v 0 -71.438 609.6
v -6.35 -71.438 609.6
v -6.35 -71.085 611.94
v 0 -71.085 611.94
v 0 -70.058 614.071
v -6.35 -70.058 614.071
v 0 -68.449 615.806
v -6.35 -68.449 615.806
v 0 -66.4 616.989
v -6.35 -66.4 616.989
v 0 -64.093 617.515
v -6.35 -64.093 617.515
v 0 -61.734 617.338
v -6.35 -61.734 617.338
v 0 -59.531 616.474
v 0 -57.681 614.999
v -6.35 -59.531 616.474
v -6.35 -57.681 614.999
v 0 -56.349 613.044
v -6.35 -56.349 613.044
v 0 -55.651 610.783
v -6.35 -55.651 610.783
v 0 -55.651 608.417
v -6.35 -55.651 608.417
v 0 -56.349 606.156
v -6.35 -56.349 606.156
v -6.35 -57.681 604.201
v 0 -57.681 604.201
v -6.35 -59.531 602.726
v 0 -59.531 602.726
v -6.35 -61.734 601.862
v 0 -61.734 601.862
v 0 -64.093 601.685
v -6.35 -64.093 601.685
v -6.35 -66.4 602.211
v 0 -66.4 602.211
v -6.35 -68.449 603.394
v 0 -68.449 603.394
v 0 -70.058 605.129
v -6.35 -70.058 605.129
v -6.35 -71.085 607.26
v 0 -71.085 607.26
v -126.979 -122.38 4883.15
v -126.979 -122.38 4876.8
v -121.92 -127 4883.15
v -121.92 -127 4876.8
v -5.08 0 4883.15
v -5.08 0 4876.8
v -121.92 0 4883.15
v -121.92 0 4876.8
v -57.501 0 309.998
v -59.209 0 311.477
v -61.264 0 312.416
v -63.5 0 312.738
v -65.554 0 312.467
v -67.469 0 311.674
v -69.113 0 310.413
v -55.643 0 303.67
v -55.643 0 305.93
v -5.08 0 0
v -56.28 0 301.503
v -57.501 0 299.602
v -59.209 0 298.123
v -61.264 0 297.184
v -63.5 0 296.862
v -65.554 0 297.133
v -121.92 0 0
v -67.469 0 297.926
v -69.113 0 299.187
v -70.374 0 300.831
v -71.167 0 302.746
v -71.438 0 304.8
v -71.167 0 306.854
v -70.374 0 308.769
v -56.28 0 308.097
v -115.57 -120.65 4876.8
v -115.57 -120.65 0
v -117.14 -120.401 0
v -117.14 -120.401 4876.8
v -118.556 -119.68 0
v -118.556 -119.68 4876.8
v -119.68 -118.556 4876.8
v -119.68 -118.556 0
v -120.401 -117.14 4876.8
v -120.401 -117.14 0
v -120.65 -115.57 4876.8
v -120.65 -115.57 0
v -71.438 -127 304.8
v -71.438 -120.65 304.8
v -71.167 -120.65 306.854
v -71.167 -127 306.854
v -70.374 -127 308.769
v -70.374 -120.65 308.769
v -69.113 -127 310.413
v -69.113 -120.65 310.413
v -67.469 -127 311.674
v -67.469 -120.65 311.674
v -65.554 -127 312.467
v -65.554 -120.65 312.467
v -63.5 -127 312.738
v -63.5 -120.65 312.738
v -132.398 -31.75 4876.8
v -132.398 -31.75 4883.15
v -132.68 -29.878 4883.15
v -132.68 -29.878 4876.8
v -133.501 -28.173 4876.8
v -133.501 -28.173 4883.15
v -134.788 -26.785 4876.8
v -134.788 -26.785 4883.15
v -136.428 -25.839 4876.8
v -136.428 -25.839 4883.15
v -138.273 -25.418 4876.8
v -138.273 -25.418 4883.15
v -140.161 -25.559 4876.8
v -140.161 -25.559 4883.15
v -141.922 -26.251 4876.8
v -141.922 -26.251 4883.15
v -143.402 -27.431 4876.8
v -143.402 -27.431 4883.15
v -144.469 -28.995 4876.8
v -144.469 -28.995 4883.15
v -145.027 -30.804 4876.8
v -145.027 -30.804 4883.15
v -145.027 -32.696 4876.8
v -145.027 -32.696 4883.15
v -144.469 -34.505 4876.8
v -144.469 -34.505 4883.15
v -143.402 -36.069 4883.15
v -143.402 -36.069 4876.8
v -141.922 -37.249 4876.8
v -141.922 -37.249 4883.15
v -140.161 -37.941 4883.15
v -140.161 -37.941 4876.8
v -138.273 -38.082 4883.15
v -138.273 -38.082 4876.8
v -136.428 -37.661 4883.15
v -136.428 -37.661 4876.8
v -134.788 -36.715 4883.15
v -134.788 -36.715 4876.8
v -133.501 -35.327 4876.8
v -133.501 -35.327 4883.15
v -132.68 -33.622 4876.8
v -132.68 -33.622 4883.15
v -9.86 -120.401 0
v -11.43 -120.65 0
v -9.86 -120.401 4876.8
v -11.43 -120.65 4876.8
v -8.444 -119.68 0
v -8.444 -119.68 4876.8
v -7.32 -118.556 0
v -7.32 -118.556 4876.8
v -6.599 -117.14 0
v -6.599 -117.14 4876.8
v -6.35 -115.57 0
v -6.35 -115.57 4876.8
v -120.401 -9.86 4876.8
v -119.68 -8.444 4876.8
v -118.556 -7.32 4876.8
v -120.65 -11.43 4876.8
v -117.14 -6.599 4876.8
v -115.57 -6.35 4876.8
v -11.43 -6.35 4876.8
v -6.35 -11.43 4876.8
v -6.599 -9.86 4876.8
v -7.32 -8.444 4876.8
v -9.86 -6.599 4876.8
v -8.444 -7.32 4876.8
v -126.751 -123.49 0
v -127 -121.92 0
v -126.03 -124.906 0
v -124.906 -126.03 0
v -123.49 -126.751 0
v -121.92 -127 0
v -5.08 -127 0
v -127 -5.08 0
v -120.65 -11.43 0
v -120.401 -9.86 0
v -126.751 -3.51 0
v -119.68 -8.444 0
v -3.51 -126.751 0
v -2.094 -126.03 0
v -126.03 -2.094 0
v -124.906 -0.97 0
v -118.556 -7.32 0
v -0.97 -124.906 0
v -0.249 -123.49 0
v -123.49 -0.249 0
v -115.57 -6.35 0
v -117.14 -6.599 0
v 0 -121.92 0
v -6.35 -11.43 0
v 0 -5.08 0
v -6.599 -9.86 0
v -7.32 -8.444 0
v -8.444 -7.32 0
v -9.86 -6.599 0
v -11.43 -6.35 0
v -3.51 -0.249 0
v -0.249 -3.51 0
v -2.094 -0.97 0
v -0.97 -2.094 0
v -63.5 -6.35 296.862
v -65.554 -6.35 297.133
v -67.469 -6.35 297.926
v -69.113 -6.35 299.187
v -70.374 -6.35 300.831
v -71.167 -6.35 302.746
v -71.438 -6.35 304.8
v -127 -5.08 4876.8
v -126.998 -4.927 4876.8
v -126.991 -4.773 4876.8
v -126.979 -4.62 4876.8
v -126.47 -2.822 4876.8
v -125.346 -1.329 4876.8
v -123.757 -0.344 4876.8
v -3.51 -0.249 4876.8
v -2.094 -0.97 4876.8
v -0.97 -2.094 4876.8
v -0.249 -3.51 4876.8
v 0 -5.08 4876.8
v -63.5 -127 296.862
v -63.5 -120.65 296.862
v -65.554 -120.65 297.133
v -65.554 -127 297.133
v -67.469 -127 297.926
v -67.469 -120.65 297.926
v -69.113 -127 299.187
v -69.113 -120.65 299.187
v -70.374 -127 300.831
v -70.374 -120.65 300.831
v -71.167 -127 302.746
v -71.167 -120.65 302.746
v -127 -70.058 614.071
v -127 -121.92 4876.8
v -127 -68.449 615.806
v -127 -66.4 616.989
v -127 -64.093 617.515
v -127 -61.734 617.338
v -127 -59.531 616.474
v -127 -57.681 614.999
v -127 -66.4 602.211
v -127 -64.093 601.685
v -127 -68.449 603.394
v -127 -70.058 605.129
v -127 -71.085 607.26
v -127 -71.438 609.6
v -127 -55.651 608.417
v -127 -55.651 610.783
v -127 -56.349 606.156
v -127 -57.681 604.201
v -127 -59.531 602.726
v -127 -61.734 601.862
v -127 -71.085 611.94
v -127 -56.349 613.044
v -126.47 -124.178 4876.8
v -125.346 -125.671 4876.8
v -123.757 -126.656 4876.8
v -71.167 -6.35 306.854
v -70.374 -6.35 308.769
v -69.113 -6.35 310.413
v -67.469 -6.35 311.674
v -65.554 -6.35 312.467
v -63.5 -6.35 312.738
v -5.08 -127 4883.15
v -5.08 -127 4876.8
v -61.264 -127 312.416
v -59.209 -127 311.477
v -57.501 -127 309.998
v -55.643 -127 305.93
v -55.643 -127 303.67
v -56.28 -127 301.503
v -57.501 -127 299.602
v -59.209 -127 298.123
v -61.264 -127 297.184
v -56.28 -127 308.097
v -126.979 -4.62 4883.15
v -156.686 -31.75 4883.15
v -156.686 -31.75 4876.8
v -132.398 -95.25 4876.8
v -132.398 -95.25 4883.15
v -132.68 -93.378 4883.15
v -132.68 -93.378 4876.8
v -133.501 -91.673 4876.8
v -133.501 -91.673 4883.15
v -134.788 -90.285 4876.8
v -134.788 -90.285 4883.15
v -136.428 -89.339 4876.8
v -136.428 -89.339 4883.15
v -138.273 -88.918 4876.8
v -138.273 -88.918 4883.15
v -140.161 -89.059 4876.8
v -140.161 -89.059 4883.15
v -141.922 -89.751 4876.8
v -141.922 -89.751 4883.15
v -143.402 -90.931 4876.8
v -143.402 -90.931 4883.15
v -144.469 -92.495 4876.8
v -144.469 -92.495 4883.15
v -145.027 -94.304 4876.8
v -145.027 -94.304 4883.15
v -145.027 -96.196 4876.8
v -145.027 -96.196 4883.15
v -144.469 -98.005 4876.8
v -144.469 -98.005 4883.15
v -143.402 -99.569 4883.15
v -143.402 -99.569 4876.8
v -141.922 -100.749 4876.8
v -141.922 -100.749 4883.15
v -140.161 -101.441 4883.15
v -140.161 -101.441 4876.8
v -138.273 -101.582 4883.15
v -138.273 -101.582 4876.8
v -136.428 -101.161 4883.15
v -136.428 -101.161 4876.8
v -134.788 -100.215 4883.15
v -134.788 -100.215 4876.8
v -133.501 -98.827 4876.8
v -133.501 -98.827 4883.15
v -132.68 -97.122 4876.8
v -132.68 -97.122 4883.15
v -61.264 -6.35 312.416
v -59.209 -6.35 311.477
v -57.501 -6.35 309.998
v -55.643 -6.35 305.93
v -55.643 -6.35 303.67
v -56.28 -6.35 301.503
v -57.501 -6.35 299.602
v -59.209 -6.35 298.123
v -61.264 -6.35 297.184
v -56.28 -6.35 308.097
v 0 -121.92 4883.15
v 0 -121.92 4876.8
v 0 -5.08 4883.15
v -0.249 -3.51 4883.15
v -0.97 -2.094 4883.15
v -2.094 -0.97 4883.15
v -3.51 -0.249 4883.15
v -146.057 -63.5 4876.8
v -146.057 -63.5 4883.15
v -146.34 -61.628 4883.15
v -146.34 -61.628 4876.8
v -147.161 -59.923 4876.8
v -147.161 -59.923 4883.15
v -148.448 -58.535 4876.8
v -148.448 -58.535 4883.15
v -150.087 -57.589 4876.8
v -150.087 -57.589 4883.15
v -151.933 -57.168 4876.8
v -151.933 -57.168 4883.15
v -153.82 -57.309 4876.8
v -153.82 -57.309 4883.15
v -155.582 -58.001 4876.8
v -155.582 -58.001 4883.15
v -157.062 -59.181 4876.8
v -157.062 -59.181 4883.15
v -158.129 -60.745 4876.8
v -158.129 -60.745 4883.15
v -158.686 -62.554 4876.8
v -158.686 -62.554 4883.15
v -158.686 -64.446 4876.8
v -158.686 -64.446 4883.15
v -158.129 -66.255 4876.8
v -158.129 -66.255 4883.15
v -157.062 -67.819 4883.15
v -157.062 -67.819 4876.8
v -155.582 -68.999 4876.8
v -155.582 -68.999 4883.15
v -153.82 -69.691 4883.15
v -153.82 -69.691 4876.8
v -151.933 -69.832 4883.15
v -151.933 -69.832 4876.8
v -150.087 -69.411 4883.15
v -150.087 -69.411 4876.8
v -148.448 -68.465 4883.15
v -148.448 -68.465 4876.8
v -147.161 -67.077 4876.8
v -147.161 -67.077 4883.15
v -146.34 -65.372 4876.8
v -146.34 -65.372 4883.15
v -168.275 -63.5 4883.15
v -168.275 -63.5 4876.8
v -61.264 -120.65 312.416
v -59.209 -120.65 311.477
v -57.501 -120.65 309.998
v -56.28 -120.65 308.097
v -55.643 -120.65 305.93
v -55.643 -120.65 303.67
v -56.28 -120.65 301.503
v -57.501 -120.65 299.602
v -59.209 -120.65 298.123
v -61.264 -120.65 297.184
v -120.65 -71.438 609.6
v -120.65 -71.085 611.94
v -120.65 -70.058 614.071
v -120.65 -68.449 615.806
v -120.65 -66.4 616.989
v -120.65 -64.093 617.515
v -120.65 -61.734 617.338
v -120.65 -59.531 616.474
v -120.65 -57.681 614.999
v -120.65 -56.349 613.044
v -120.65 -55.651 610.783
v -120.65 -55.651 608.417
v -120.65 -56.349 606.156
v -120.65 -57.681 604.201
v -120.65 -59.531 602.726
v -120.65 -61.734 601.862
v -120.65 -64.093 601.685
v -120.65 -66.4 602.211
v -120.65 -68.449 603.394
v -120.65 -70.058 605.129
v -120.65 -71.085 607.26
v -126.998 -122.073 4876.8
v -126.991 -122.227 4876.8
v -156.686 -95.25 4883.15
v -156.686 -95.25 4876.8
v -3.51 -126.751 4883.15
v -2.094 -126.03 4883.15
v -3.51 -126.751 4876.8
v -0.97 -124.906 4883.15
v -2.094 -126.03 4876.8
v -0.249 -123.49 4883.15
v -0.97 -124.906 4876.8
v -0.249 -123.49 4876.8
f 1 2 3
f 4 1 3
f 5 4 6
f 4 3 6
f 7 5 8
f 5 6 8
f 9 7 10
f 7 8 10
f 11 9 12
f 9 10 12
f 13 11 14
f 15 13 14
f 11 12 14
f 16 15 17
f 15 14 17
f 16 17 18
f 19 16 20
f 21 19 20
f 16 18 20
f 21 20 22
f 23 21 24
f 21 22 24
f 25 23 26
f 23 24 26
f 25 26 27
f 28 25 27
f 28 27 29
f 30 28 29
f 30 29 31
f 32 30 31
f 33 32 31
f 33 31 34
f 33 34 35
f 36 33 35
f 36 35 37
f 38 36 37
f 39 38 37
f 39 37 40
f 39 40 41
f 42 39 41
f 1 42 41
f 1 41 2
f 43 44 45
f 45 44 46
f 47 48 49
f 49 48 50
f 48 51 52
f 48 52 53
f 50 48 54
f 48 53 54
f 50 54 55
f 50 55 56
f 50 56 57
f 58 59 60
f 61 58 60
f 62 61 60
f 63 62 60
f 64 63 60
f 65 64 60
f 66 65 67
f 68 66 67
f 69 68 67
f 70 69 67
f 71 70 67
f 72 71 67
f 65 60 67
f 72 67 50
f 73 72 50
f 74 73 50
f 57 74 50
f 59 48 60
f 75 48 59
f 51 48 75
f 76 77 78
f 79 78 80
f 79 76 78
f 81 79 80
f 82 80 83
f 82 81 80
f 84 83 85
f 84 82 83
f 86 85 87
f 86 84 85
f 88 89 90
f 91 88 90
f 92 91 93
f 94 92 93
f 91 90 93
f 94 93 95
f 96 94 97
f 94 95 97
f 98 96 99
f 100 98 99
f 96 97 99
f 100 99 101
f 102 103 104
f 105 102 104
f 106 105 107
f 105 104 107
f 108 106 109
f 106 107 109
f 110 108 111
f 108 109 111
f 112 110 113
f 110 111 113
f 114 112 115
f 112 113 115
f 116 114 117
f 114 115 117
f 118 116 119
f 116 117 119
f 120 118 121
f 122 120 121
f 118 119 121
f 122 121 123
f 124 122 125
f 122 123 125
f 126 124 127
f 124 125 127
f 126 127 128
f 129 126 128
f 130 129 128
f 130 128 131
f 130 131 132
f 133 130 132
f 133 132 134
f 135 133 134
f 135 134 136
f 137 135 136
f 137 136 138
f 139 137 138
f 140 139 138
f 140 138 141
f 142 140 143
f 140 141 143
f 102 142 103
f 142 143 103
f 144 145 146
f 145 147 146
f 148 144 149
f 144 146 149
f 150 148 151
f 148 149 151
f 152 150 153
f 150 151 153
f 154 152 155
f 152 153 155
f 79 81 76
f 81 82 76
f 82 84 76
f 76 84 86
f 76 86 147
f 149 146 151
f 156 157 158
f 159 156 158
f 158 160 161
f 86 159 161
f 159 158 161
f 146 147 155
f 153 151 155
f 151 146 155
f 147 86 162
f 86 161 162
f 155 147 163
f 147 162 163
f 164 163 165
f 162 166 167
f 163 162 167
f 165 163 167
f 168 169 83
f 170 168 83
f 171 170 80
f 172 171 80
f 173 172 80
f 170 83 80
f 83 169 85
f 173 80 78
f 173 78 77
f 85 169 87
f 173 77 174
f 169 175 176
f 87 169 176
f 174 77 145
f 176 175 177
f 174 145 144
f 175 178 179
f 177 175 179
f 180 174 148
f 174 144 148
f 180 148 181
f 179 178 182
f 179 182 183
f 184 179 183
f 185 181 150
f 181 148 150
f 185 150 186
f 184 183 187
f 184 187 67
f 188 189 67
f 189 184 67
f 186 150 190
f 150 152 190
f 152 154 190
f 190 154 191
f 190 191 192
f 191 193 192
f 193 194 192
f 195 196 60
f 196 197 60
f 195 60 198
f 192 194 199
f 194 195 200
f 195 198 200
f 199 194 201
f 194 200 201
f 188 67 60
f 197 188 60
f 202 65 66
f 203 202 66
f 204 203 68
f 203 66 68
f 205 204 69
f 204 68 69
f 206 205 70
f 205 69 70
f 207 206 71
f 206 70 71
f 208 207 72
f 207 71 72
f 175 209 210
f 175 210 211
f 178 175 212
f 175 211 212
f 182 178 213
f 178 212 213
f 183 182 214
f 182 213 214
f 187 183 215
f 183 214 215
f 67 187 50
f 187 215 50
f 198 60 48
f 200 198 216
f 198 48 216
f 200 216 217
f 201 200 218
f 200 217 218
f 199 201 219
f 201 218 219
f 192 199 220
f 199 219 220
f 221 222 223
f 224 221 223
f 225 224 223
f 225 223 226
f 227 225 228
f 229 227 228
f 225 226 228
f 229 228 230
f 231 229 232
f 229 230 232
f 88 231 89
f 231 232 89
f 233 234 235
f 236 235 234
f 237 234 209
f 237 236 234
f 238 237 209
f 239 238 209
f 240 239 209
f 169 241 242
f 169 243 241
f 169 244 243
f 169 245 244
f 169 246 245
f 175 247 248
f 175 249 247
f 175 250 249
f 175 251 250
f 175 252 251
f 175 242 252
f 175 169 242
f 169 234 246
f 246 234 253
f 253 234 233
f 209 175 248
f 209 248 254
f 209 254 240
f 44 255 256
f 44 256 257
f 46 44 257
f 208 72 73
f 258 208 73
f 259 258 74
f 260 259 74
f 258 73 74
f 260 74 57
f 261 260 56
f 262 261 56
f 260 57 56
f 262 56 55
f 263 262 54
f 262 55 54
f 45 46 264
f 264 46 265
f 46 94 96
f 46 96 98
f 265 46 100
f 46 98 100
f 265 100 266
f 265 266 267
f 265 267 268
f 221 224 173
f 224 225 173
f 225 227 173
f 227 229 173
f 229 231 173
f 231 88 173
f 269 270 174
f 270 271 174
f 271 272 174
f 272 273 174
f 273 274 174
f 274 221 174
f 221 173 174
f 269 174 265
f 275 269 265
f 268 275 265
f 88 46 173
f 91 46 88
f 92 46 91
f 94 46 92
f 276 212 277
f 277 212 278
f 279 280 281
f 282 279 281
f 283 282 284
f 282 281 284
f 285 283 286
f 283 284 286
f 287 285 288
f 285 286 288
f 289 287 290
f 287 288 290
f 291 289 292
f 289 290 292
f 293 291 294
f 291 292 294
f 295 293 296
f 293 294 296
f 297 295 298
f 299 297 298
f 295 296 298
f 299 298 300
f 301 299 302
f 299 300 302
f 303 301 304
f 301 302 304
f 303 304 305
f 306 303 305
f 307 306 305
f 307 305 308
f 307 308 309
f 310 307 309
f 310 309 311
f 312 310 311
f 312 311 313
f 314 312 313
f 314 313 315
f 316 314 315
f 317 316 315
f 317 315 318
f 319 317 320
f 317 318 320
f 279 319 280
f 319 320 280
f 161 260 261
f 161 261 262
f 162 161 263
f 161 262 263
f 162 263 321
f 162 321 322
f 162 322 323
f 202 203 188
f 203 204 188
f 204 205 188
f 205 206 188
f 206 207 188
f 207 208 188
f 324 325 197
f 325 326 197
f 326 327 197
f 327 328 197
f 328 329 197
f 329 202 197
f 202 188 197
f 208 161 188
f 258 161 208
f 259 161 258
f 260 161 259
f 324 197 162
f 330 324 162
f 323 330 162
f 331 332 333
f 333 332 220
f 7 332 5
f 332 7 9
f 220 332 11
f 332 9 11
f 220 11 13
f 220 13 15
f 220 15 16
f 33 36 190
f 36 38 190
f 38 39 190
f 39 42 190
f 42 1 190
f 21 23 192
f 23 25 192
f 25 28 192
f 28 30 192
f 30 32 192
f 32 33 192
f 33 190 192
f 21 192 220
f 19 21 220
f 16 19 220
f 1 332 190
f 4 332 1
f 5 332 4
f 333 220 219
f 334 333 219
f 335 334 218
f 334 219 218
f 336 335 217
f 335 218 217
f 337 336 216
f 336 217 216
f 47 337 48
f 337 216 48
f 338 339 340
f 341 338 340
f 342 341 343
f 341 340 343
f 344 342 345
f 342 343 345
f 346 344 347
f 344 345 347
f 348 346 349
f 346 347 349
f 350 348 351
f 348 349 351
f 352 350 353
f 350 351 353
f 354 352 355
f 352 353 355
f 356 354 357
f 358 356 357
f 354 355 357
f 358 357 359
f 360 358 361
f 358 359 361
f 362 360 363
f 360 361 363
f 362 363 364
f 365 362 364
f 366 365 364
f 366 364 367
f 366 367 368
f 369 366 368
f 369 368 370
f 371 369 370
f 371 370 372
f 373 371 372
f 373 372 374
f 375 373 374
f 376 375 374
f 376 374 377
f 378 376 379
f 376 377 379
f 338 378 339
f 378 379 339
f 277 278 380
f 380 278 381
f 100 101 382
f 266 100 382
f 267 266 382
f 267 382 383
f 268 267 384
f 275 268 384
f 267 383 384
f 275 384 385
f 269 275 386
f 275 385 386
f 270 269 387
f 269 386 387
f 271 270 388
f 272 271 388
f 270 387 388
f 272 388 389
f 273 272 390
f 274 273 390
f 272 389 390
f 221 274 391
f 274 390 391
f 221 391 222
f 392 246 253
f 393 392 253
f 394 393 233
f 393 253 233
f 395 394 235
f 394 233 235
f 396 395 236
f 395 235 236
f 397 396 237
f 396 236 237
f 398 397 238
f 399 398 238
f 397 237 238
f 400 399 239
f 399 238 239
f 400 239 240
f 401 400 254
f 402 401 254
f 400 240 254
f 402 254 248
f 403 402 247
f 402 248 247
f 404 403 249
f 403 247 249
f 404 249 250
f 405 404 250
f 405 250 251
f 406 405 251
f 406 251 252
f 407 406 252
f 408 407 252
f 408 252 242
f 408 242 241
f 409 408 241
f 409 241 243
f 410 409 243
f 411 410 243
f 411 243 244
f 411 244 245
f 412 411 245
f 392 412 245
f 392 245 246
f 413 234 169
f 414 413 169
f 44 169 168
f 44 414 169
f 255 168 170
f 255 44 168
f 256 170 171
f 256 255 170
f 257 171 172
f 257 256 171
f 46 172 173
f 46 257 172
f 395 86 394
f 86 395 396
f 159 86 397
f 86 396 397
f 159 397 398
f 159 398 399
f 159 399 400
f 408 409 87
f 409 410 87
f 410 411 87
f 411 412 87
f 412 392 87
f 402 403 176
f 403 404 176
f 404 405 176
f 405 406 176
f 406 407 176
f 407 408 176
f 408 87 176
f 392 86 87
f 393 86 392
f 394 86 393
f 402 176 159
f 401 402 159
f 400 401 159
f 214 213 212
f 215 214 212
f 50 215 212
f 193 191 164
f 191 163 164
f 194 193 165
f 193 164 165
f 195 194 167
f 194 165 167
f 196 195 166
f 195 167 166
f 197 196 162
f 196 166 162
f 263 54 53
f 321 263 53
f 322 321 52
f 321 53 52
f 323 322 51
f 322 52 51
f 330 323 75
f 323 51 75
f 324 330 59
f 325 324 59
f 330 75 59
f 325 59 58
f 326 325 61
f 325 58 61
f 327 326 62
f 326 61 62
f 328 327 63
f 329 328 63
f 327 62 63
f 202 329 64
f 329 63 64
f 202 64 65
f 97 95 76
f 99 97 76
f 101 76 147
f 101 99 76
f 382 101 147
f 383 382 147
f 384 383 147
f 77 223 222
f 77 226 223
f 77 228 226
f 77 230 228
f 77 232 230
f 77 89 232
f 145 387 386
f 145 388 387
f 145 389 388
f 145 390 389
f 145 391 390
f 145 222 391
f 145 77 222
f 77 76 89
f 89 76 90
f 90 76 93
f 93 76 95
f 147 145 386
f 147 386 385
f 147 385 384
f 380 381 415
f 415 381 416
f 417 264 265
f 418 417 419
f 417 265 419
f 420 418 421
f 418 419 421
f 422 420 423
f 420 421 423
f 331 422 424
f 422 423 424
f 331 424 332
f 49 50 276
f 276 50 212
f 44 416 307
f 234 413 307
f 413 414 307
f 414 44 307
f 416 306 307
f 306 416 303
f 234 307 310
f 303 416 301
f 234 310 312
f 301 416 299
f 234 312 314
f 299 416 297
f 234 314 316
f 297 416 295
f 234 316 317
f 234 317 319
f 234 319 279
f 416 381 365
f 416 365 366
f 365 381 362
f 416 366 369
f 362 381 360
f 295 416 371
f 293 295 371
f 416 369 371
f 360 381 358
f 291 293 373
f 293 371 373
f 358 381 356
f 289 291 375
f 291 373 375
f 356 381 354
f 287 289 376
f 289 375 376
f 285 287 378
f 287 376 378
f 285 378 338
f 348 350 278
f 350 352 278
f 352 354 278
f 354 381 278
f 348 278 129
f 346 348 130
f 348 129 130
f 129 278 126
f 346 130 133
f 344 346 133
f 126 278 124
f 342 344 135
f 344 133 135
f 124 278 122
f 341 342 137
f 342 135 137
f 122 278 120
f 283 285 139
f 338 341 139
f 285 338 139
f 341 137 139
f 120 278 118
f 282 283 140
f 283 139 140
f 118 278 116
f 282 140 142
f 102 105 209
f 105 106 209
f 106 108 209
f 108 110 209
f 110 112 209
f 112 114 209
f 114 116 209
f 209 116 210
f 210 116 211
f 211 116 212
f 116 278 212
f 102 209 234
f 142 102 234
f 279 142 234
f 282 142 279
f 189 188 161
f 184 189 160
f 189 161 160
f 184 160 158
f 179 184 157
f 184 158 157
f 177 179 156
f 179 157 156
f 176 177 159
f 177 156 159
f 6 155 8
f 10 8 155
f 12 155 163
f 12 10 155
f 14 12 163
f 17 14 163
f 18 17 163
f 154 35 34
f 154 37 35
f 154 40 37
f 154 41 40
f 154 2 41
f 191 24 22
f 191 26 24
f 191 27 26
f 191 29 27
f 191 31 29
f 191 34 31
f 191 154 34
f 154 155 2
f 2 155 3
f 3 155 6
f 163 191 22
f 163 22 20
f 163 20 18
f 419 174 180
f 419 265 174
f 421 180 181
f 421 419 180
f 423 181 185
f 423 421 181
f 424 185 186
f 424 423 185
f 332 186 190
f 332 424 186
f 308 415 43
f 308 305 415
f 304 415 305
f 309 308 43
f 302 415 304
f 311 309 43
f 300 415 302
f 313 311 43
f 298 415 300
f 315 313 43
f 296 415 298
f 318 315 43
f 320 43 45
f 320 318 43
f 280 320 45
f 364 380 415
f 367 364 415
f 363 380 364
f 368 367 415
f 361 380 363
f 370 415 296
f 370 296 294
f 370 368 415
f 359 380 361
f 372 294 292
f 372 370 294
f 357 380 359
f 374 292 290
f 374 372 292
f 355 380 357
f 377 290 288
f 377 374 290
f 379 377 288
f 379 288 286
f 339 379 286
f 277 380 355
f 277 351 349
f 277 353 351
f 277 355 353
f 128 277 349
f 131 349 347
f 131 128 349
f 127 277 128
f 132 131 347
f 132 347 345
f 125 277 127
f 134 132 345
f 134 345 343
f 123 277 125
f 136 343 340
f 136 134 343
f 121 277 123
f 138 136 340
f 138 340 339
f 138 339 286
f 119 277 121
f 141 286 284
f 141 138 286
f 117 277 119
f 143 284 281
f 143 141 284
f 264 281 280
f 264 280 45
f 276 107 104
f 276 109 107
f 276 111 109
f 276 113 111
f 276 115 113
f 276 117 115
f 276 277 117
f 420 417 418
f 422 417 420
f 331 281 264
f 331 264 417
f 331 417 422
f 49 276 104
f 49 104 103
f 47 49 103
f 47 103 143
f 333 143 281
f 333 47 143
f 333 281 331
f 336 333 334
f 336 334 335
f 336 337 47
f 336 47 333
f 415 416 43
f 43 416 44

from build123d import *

# Parameters (mm, degrees)
F0_W      = 127
F0_H      = 127
F0_W_2    = 114.3
F0_H_2    = 114.3
F1_DEPTH  = 4876.8
F2_R      = 5.08
F4_DEPTH  = 127
F5_R      = 7.9375
F6_DEPTH  = 127
F8_DEPTH  = 6.35
F9_R      = 6.35
F10_DEPTH = 6.35


with BuildPart() as f1:
    # F0 (on Top) → F1 (new body)
    with BuildSketch(Plane.XY):
        with Locations((-63.5, -63.5)):
            Rectangle(F0_W, F0_H)
        with Locations((-63.5, -63.5)):
            Rectangle(F0_W_2, F0_H_2, mode=Mode.SUBTRACT)
    extrude(amount=F1_DEPTH)

    # F2
    f2_edges = [f1.edges().sort_by_distance(p)[0] for p in [
        (-127, 0, 2438.4),
        (-6.35, -6.35, 2438.4),
        (0, -127, 2438.4),
        (-127, -127, 2438.4),
        (-120.65, -6.35, 2438.4),
        (-120.65, -120.65, 2438.4),
        (0, 0, 2438.4),
        (-6.35, -120.65, 2438.4),
    ]]
    fillet(f2_edges, radius=F2_R)

    # F3 (on face) → F4 (cut)
    with BuildSketch(Plane(origin=(0, 0, 0), x_dir=(-1, 0, 0), z_dir=(0, 1, 0))):
        with BuildLine():
            ThreePointArc((63.5, 312.7375), (55.5625, 304.8), (63.5, 296.8625))
            Line((63.5, 296.8625), (63.5, 312.7375))
        make_face()
        with BuildLine():
            Line((63.5, 312.7375), (63.5, 296.8625))
            ThreePointArc((63.5, 296.8625), (69.1126600757, 299.1873399243), (71.4375, 304.8))
            ThreePointArc((71.4375, 304.8), (69.1126600757, 310.4126600757), (63.5, 312.7375))
        make_face()
    extrude(amount=-F4_DEPTH, mode=Mode.SUBTRACT)

    # F5 (on face) → F6 (cut)
    with BuildSketch(Plane(origin=(-127, 0, 0), x_dir=(0, -1, 0), z_dir=(-1, 0, 0))):
        with Locations((63.5, 609.6)):
            Circle(F5_R)
    extrude(amount=-F6_DEPTH, mode=Mode.SUBTRACT)

    # F7 (on face) → F8 (join)
    with BuildSketch(Plane.XY.offset(4876.8)):
        with BuildLine():
            Line((-156.68625, -95.25), (-126.9791512147, -122.3797705801))
            ThreePointArc((-126.9791512147, -122.3797705801), (-126.994785127, -122.1501215213), (-127, -121.92))
            Line((-127, -121.92), (-127, -5.08))
            ThreePointArc((-127, -5.08), (-126.994785127, -4.8498784787), (-126.9791512147, -4.6202294199))
            Line((-126.9791512147, -4.6202294199), (-156.68625, -31.75))
            Line((-156.68625, -31.75), (-168.275, -63.5))
            Line((-168.275, -63.5), (-156.68625, -95.25))
        make_face()
        with BuildLine():
            Line((-121.92, -127), (-5.08, -127))
            ThreePointArc((-5.08, -127), (-1.4878975516, -125.5121024484), (0, -121.92))
            Line((0, -121.92), (0, -5.08))
            ThreePointArc((0, -5.08), (-1.4878975516, -1.4878975516), (-5.08, 0))
            Line((-5.08, 0), (-121.92, 0))
            Line((-121.92, 0), (-126.9791512147, -4.6202294199))
            ThreePointArc((-126.9791512147, -4.6202294199), (-126.994785127, -4.8498784787), (-127, -5.08))
            Line((-127, -5.08), (-127, -121.92))
            ThreePointArc((-127, -121.92), (-126.994785127, -122.1501215213), (-126.9791512147, -122.3797705801))
            Line((-126.9791512147, -122.3797705801), (-121.92, -127))
        make_face()
        with BuildLine():
            ThreePointArc((-11.43, -6.35), (-7.8378975516, -7.8378975516), (-6.35, -11.43))
            Line((-6.35, -11.43), (-6.35, -115.57))
            ThreePointArc((-6.35, -115.57), (-7.8378975516, -119.1621024484), (-11.43, -120.65))
            Line((-11.43, -120.65), (-115.57, -120.65))
            ThreePointArc((-115.57, -120.65), (-119.1621024484, -119.1621024484), (-120.65, -115.57))
            Line((-120.65, -115.57), (-120.65, -11.43))
            ThreePointArc((-120.65, -11.43), (-119.1621024484, -7.8378975516), (-115.57, -6.35))
            Line((-115.57, -6.35), (-11.43, -6.35))
        make_face(mode=Mode.SUBTRACT)
        with BuildLine():
            Line((-6.35, -115.57), (-6.35, -11.43))
            ThreePointArc((-6.35, -11.43), (-7.8378975516, -7.8378975516), (-11.43, -6.35))
            Line((-11.43, -6.35), (-115.57, -6.35))
            ThreePointArc((-115.57, -6.35), (-119.1621024484, -7.8378975516), (-120.65, -11.43))
            Line((-120.65, -11.43), (-120.65, -115.57))
            ThreePointArc((-120.65, -115.57), (-119.1621024484, -119.1621024484), (-115.57, -120.65))
            Line((-115.57, -120.65), (-11.43, -120.65))
            ThreePointArc((-11.43, -120.65), (-7.8378975516, -119.1621024484), (-6.35, -115.57))
        make_face()
    extrude(amount=F8_DEPTH)

    # F9 (on face) → F10 (cut)
    with BuildSketch(Plane.XY.offset(4883.15)):
        with Locations((-138.7475, -31.75)):
            Circle(F9_R)
        with Locations((-152.4073928595, -63.5)):
            Circle(F9_R)
        with Locations((-138.7475, -95.25)):
            Circle(F9_R)
    extrude(amount=-F10_DEPTH, mode=Mode.SUBTRACT)


solid = f1.part
